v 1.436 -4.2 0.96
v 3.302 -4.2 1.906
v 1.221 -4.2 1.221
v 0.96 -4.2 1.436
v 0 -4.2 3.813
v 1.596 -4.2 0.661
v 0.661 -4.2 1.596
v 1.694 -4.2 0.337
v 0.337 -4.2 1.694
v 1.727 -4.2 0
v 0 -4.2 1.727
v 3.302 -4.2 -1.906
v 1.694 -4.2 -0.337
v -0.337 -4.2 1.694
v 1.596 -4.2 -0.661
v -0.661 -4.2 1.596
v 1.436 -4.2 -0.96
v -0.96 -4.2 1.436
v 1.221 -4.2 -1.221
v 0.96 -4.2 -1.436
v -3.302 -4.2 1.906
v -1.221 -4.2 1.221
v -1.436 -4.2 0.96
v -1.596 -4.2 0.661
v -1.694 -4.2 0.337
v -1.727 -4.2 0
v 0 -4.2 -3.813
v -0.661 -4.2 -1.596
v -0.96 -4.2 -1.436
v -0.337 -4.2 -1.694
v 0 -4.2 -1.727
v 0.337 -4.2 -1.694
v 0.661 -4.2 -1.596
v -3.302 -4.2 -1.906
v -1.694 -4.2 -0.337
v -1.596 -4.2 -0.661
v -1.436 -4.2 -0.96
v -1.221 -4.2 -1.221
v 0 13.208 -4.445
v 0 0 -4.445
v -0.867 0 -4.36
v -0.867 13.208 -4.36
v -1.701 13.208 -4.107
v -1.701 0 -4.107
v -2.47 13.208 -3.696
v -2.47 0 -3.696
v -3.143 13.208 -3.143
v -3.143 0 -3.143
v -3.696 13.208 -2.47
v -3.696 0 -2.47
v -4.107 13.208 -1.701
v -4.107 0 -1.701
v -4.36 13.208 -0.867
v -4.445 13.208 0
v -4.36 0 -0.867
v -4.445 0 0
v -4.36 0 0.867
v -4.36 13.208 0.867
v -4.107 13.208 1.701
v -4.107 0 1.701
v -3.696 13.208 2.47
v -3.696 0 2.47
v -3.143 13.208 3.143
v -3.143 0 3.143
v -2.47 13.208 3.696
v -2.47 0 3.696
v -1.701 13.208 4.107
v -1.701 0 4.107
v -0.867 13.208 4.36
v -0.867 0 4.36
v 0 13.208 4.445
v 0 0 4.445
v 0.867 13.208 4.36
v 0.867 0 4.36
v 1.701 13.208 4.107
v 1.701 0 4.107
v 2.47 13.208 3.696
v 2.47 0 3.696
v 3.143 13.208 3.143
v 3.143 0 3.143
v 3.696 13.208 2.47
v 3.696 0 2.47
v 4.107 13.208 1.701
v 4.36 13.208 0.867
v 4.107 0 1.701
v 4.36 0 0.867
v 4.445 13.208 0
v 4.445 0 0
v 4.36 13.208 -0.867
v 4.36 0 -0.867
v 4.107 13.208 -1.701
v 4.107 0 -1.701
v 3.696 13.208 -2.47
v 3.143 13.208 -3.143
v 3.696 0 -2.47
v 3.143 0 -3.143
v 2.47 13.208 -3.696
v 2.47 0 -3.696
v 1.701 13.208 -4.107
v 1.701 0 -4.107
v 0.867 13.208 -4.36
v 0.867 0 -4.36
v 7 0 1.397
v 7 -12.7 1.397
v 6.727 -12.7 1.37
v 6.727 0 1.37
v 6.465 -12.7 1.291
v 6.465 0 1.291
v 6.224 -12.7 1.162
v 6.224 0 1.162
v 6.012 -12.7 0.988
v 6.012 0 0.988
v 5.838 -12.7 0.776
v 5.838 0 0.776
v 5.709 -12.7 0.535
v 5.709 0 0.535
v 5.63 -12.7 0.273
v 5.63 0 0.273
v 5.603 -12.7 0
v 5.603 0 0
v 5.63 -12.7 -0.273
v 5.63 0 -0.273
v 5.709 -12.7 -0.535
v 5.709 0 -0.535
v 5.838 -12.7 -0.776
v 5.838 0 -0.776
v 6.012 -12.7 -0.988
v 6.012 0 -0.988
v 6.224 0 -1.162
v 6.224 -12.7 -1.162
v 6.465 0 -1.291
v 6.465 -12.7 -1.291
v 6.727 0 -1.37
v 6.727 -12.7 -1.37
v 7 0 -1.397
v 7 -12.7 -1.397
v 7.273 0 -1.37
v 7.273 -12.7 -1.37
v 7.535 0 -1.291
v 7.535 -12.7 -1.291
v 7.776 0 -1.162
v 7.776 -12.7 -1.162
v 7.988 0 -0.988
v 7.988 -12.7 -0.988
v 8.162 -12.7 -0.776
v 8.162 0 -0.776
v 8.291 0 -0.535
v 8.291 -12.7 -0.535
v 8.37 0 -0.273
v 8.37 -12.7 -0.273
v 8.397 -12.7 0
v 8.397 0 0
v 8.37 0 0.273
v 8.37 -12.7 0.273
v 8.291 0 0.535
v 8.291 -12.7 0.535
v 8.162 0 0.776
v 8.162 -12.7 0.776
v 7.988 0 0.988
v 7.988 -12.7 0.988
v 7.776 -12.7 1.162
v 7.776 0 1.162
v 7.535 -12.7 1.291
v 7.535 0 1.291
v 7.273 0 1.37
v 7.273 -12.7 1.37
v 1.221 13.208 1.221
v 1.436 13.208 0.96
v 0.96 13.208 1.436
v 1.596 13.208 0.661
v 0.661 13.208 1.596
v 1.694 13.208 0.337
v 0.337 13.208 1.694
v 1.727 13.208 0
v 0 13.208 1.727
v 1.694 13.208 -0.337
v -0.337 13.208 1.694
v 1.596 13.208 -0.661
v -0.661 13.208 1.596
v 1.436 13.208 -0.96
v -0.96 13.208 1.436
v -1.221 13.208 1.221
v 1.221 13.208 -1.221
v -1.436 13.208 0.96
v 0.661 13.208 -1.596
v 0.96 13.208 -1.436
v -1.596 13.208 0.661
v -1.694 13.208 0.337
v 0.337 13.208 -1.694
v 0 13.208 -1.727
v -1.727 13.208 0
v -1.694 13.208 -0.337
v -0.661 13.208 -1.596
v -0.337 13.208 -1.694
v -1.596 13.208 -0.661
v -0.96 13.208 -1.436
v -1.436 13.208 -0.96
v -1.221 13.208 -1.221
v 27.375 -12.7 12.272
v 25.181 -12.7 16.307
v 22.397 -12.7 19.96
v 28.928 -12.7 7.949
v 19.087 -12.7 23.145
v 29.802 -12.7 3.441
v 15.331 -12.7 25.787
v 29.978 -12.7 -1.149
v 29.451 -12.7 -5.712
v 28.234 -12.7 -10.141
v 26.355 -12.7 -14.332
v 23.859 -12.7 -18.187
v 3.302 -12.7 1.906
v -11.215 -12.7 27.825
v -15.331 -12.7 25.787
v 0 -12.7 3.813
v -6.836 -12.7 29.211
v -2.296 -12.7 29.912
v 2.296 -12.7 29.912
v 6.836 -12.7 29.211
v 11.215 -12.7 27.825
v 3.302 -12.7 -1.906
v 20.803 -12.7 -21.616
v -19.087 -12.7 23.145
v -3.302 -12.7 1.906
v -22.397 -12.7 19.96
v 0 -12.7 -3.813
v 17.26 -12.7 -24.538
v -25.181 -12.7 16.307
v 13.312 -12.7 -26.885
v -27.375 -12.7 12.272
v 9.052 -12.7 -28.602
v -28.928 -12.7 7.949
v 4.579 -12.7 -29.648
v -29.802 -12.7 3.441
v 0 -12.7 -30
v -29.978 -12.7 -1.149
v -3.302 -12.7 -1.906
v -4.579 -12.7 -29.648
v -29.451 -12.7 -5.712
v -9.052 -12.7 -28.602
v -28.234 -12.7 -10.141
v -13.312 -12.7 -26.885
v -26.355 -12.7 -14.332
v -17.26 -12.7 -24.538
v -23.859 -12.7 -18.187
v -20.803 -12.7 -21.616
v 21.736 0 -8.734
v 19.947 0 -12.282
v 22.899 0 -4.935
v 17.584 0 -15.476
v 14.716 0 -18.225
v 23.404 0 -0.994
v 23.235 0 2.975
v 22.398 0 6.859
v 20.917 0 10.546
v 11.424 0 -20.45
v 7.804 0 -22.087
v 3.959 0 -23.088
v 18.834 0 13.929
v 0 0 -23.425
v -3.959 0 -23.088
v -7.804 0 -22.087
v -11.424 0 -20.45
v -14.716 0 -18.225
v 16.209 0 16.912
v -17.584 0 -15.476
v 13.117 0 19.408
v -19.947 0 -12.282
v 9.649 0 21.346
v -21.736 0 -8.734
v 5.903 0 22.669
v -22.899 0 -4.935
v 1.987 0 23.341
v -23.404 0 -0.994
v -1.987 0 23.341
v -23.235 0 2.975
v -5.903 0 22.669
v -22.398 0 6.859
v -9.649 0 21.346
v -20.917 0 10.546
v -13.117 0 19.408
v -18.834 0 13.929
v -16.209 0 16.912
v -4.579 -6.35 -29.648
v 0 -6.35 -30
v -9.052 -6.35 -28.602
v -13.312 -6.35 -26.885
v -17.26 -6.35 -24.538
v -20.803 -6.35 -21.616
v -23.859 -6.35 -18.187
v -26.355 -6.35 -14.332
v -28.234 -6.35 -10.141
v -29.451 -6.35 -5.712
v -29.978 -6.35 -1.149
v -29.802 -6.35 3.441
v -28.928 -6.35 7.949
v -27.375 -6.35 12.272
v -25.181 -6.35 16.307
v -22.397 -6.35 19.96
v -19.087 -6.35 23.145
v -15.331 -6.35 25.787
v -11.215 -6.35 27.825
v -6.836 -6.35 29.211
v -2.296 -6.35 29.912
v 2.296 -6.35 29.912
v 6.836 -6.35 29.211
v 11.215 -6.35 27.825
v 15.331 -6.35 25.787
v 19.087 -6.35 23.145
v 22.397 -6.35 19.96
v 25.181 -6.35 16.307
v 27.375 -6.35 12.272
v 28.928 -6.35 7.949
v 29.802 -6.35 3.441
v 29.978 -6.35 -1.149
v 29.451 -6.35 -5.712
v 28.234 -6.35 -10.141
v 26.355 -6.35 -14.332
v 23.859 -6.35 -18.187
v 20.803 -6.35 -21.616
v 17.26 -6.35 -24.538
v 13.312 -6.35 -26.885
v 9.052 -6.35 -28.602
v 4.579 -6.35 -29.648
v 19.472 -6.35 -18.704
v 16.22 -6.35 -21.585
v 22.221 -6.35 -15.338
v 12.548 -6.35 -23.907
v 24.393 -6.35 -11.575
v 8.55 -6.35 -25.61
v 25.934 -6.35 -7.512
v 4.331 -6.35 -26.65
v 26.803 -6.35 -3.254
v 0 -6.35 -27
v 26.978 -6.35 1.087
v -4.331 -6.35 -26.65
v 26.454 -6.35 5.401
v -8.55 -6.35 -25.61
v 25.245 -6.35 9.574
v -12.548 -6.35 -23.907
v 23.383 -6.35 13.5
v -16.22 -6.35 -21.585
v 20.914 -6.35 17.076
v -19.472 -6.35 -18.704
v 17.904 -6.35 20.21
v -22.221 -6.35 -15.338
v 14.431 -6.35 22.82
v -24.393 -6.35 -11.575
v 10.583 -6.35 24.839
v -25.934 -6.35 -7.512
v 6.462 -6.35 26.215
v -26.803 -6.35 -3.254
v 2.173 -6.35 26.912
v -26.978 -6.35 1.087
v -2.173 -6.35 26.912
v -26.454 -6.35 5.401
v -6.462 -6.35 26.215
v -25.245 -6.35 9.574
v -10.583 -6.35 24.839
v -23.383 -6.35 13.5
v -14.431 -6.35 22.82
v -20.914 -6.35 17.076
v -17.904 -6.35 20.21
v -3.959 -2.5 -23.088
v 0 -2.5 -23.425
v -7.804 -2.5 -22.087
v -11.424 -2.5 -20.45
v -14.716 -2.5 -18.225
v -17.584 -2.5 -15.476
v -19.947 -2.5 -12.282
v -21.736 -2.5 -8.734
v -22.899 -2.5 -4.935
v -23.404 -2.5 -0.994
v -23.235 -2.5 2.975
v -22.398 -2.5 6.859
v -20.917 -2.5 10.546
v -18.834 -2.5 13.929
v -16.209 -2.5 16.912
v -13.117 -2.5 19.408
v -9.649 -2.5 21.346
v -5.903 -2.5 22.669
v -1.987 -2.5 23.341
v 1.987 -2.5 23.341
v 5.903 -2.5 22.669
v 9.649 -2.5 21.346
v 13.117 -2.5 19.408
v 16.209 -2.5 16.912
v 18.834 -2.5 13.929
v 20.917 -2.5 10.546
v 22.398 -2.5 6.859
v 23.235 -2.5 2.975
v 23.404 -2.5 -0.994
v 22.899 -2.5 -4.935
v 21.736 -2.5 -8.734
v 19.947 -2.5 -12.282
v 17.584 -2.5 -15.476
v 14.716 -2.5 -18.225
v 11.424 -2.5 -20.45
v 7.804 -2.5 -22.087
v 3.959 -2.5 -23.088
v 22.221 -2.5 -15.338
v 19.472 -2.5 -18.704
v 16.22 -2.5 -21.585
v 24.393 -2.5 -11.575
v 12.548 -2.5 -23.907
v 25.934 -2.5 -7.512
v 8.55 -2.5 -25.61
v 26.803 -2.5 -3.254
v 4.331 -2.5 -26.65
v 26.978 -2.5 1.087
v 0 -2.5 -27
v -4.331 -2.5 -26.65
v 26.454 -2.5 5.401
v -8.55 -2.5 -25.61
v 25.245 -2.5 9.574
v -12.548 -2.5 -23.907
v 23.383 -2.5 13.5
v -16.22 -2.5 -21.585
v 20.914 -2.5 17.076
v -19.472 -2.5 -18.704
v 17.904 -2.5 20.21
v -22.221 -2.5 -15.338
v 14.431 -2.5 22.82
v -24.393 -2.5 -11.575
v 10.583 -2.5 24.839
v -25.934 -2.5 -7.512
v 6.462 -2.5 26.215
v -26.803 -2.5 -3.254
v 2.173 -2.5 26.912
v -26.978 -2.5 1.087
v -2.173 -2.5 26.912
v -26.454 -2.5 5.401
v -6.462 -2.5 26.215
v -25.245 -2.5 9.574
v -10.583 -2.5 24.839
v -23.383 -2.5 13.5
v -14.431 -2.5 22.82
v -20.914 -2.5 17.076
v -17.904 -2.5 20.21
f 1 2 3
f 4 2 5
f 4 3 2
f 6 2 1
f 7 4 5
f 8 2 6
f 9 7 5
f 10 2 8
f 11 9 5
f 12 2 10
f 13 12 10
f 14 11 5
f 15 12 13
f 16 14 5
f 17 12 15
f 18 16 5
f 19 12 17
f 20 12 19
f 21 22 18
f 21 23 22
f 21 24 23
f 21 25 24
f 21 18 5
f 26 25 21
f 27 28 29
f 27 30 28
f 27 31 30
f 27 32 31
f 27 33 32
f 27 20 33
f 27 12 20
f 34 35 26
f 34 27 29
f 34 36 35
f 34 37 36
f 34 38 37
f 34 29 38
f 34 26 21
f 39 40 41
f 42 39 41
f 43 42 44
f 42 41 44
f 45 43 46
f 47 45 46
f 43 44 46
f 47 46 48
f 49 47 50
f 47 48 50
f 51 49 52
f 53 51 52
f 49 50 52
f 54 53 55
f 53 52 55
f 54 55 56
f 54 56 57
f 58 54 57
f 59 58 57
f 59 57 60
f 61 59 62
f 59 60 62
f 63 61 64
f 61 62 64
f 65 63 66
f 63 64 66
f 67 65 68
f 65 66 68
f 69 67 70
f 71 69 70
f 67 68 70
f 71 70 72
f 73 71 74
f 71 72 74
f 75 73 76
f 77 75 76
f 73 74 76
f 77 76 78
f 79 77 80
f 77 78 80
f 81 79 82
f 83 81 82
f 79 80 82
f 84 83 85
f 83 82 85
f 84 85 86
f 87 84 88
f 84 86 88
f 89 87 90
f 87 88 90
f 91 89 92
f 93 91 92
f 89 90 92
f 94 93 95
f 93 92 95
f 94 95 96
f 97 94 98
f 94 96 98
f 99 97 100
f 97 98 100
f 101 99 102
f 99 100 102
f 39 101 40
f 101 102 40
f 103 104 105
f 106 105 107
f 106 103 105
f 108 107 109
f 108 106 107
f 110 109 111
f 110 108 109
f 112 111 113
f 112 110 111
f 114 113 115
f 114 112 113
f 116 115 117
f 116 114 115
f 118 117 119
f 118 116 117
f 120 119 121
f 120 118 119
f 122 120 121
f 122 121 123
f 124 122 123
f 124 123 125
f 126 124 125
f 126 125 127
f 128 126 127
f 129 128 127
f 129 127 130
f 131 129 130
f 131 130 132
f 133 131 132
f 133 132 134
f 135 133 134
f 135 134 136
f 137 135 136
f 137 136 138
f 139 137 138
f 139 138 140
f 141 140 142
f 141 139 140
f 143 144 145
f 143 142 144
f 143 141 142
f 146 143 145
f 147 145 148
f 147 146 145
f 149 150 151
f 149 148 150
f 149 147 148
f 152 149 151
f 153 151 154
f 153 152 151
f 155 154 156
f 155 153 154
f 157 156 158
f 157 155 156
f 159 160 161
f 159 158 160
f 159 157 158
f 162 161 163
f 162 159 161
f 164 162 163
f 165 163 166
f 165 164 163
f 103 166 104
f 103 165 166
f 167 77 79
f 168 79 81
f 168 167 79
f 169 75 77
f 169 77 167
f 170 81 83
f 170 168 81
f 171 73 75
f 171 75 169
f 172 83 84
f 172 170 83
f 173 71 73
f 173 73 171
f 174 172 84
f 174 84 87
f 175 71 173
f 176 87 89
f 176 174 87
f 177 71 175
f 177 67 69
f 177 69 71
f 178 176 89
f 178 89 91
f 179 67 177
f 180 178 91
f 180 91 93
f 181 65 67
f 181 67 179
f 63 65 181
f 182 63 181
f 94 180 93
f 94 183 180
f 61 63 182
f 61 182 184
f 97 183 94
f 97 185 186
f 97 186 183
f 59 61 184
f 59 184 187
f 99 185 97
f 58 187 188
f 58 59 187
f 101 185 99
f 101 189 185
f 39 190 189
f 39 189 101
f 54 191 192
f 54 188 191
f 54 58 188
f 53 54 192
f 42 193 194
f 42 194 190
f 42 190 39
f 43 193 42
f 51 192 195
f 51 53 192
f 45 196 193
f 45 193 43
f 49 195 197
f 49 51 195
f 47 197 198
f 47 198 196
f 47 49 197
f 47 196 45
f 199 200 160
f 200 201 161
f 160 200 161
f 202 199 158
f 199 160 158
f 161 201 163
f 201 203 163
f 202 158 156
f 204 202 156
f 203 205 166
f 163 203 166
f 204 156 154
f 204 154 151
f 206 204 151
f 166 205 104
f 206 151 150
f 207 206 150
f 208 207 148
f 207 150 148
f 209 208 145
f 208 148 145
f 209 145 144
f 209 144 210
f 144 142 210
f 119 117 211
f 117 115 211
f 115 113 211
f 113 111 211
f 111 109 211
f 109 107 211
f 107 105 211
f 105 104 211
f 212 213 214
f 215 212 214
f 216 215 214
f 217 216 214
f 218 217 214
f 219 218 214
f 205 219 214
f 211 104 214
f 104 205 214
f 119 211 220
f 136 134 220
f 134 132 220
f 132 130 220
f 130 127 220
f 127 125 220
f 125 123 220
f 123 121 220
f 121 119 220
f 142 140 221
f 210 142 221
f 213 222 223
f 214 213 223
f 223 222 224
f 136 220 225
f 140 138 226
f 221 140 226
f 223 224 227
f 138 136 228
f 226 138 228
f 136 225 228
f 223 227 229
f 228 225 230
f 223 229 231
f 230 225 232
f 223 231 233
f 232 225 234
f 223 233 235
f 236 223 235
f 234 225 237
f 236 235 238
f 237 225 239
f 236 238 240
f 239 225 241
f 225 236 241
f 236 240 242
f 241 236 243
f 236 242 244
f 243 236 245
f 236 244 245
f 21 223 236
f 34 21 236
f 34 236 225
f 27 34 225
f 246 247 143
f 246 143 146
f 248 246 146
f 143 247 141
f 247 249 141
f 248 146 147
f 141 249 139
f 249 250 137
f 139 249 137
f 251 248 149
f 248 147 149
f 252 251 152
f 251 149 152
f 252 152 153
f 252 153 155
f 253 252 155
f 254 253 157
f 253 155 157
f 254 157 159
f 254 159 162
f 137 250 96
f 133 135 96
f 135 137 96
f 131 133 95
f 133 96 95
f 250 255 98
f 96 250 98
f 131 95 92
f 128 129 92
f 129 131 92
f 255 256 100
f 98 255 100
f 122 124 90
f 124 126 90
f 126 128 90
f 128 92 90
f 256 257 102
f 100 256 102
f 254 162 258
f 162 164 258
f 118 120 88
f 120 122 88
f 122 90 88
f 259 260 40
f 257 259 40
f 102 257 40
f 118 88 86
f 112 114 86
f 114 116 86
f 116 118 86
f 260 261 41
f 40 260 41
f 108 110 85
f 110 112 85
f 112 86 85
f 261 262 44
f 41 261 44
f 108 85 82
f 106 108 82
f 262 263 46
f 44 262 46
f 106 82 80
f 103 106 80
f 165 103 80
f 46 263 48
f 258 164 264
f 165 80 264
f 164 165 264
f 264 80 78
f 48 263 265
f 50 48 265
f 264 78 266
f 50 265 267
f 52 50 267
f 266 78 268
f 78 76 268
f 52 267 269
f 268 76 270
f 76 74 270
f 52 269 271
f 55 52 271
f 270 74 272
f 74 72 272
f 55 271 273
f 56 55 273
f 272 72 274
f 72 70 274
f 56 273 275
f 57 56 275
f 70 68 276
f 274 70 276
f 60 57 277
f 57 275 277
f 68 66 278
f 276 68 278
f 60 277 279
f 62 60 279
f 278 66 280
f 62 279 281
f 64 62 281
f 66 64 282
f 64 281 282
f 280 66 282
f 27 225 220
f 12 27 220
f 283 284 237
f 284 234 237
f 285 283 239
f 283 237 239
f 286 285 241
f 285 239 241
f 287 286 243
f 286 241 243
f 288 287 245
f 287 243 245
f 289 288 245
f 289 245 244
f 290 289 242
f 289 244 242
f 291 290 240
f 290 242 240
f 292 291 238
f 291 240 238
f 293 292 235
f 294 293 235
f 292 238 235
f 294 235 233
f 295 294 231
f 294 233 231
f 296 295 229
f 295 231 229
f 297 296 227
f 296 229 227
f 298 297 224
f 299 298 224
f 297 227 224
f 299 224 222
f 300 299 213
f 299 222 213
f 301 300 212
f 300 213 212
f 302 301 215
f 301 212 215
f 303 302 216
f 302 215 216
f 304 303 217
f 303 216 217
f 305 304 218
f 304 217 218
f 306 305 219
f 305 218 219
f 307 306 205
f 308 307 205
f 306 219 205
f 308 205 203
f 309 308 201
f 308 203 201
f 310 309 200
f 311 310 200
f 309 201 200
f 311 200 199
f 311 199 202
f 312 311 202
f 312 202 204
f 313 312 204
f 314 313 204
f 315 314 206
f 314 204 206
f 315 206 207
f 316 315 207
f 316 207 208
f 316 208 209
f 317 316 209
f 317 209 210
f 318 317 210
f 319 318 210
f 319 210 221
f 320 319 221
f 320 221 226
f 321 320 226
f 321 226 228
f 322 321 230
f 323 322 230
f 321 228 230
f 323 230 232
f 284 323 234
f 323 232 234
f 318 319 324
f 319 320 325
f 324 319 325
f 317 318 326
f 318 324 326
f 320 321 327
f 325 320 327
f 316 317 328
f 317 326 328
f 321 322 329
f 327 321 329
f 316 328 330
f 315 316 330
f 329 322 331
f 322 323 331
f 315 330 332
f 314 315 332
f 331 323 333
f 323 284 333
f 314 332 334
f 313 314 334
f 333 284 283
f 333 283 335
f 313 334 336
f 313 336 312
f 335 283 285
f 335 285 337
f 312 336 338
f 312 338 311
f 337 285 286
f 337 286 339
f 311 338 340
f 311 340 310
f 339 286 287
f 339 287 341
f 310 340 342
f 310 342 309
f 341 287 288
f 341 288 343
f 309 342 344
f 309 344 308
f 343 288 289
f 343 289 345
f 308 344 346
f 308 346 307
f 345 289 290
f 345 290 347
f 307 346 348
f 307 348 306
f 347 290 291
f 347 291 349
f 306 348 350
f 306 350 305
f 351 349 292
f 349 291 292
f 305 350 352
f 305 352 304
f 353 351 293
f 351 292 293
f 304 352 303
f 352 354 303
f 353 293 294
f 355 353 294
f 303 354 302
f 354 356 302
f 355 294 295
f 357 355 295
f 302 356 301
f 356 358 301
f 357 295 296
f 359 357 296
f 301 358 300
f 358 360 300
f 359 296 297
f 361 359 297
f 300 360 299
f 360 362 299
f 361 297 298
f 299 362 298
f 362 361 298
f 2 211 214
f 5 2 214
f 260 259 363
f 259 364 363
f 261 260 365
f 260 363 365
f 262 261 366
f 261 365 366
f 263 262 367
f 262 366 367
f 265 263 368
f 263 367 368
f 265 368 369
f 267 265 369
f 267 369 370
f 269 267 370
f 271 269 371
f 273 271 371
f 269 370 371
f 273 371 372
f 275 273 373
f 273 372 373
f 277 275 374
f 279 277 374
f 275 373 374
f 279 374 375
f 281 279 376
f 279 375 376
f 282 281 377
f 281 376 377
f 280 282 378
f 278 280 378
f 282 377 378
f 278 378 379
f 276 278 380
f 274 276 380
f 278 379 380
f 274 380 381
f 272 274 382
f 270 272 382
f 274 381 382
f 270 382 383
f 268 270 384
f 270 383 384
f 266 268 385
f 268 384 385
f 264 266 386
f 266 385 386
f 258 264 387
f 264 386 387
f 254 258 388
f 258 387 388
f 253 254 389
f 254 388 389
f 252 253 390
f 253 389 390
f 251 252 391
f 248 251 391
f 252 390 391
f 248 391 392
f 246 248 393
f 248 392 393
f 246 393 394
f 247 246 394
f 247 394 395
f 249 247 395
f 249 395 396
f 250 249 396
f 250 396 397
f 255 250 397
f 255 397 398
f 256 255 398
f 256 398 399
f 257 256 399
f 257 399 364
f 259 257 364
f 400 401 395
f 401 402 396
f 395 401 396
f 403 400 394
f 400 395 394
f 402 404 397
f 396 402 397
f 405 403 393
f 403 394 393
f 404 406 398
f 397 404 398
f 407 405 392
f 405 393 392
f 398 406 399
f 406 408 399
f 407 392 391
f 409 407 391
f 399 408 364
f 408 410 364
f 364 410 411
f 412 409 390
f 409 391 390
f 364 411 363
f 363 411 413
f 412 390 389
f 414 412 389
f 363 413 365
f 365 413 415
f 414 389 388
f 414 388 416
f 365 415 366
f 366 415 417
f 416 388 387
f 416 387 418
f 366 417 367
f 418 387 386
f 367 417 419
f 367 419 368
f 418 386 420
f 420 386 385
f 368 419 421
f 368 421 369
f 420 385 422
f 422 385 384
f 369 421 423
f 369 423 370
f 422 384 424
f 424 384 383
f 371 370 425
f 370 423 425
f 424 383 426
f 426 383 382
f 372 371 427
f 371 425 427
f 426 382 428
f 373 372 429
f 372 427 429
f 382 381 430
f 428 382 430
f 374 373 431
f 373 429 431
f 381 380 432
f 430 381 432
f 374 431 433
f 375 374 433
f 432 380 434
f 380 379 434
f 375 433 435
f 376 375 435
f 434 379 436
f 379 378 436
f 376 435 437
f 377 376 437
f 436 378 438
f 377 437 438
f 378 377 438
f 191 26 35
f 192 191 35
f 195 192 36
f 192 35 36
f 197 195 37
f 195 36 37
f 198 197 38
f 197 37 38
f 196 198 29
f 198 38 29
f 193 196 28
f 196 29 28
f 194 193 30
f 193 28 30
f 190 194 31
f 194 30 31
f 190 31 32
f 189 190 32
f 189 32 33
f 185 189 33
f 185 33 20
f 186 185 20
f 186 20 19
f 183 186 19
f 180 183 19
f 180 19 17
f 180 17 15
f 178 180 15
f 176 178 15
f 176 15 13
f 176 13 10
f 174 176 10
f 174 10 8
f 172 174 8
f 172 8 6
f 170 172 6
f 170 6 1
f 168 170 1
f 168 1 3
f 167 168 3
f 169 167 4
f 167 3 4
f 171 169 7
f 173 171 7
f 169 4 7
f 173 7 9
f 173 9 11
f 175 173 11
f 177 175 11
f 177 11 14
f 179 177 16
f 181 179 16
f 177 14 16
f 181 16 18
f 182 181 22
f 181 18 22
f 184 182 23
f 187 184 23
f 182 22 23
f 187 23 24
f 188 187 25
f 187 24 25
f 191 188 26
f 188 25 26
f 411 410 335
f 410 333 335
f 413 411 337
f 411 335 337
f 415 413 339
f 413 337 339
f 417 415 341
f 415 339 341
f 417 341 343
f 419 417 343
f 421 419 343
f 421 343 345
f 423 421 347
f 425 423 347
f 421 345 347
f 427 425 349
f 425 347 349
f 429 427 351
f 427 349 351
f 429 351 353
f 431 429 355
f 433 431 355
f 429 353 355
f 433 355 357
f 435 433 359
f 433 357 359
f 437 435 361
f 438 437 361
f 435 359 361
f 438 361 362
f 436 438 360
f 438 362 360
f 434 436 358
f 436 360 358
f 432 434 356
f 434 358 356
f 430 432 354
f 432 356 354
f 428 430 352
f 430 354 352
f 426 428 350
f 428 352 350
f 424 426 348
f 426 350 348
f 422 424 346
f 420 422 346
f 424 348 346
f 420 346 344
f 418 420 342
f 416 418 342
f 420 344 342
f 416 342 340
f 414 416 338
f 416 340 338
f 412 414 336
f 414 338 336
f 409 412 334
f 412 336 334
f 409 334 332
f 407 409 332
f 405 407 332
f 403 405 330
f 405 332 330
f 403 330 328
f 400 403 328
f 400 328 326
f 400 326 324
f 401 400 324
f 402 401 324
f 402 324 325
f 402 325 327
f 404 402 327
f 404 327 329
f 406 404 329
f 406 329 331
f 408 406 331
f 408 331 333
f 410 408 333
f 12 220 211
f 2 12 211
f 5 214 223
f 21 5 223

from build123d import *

# Parameters (mm, degrees)
CUT_EXTRUDE2_REACH    = 46.286
SKETCH3_R             = 1.397
SKETCH12_R            = 4.445
BOSS_EXTRUDE1_DEPTH   = 13.208
F_4_CLEARANCE_HOLE1_D = 3.4544
CUT_EXTRUDE3_DEPTH    = 8.5


with BuildPart() as part:
    # Sketch1 → Revolve1 (revolve)
    with BuildSketch(Plane.XY, mode=Mode.PRIVATE) as revolve1_sk:
        Polygon((0, 0), (-23.425, 0), (-23.425, -2.5), (-27, -2.5), (-27, -6.35), (-30, -6.35), (-30, -12.7), (0, -12.7), align=None)
    revolve(revolve1_sk.sketch.rotate(Axis((0, -12.7, 0), (0, 1, 0)), 270), axis=Axis((0, -12.7, 0), (0, 1, 0)))

    # Sketch3 → Cut-Extrude2 (cut, up to next)
    with BuildSketch(Plane.XZ, mode=Mode.PRIVATE) as cut_extrude2_sk1:
        with Locations(Location((7, 0, 0), (0, 0, 90))):
            Circle(SKETCH3_R)
    cut_extrude2_tool1 = extrude(cut_extrude2_sk1.sketch, amount=CUT_EXTRUDE2_REACH, mode=Mode.PRIVATE) & part.part
    add(cut_extrude2_tool1.solids().sort_by_distance((7, 0, 0))[0], mode=Mode.SUBTRACT)

    # Sketch12 → Boss-Extrude1 (add)
    with BuildSketch(Plane(origin=(0, 0, 0), x_dir=(1, 0, 0), z_dir=(0, 1, 0))):
        with Locations(Location((0, 0, 0), (0, 0, 90))):
            Circle(SKETCH12_R)
    extrude(amount=BOSS_EXTRUDE1_DEPTH)

    # #4 Clearance Hole1 (through all)
    with Locations(Plane(origin=(0, 13.208, 0), x_dir=(1, 0, 0), z_dir=(0, 1, 0))):
        with Locations((0, 0)):
            Hole(F_4_CLEARANCE_HOLE1_D / 2)

    # Sketch15 → Cut-Extrude3 (cut)
    with BuildSketch(Plane(origin=(0, -12.7, 0), x_dir=(-1, 0, 0), z_dir=(0, -1, 0))):
        Polygon((0, -3.812821178), (3.302, -1.906410589), (3.302, 1.906410589), (0, 3.812821178), (-3.302, 1.906410589), (-3.302, -1.906410589), align=None)
    extrude(amount=-CUT_EXTRUDE3_DEPTH, mode=Mode.SUBTRACT)


solid = part.part
